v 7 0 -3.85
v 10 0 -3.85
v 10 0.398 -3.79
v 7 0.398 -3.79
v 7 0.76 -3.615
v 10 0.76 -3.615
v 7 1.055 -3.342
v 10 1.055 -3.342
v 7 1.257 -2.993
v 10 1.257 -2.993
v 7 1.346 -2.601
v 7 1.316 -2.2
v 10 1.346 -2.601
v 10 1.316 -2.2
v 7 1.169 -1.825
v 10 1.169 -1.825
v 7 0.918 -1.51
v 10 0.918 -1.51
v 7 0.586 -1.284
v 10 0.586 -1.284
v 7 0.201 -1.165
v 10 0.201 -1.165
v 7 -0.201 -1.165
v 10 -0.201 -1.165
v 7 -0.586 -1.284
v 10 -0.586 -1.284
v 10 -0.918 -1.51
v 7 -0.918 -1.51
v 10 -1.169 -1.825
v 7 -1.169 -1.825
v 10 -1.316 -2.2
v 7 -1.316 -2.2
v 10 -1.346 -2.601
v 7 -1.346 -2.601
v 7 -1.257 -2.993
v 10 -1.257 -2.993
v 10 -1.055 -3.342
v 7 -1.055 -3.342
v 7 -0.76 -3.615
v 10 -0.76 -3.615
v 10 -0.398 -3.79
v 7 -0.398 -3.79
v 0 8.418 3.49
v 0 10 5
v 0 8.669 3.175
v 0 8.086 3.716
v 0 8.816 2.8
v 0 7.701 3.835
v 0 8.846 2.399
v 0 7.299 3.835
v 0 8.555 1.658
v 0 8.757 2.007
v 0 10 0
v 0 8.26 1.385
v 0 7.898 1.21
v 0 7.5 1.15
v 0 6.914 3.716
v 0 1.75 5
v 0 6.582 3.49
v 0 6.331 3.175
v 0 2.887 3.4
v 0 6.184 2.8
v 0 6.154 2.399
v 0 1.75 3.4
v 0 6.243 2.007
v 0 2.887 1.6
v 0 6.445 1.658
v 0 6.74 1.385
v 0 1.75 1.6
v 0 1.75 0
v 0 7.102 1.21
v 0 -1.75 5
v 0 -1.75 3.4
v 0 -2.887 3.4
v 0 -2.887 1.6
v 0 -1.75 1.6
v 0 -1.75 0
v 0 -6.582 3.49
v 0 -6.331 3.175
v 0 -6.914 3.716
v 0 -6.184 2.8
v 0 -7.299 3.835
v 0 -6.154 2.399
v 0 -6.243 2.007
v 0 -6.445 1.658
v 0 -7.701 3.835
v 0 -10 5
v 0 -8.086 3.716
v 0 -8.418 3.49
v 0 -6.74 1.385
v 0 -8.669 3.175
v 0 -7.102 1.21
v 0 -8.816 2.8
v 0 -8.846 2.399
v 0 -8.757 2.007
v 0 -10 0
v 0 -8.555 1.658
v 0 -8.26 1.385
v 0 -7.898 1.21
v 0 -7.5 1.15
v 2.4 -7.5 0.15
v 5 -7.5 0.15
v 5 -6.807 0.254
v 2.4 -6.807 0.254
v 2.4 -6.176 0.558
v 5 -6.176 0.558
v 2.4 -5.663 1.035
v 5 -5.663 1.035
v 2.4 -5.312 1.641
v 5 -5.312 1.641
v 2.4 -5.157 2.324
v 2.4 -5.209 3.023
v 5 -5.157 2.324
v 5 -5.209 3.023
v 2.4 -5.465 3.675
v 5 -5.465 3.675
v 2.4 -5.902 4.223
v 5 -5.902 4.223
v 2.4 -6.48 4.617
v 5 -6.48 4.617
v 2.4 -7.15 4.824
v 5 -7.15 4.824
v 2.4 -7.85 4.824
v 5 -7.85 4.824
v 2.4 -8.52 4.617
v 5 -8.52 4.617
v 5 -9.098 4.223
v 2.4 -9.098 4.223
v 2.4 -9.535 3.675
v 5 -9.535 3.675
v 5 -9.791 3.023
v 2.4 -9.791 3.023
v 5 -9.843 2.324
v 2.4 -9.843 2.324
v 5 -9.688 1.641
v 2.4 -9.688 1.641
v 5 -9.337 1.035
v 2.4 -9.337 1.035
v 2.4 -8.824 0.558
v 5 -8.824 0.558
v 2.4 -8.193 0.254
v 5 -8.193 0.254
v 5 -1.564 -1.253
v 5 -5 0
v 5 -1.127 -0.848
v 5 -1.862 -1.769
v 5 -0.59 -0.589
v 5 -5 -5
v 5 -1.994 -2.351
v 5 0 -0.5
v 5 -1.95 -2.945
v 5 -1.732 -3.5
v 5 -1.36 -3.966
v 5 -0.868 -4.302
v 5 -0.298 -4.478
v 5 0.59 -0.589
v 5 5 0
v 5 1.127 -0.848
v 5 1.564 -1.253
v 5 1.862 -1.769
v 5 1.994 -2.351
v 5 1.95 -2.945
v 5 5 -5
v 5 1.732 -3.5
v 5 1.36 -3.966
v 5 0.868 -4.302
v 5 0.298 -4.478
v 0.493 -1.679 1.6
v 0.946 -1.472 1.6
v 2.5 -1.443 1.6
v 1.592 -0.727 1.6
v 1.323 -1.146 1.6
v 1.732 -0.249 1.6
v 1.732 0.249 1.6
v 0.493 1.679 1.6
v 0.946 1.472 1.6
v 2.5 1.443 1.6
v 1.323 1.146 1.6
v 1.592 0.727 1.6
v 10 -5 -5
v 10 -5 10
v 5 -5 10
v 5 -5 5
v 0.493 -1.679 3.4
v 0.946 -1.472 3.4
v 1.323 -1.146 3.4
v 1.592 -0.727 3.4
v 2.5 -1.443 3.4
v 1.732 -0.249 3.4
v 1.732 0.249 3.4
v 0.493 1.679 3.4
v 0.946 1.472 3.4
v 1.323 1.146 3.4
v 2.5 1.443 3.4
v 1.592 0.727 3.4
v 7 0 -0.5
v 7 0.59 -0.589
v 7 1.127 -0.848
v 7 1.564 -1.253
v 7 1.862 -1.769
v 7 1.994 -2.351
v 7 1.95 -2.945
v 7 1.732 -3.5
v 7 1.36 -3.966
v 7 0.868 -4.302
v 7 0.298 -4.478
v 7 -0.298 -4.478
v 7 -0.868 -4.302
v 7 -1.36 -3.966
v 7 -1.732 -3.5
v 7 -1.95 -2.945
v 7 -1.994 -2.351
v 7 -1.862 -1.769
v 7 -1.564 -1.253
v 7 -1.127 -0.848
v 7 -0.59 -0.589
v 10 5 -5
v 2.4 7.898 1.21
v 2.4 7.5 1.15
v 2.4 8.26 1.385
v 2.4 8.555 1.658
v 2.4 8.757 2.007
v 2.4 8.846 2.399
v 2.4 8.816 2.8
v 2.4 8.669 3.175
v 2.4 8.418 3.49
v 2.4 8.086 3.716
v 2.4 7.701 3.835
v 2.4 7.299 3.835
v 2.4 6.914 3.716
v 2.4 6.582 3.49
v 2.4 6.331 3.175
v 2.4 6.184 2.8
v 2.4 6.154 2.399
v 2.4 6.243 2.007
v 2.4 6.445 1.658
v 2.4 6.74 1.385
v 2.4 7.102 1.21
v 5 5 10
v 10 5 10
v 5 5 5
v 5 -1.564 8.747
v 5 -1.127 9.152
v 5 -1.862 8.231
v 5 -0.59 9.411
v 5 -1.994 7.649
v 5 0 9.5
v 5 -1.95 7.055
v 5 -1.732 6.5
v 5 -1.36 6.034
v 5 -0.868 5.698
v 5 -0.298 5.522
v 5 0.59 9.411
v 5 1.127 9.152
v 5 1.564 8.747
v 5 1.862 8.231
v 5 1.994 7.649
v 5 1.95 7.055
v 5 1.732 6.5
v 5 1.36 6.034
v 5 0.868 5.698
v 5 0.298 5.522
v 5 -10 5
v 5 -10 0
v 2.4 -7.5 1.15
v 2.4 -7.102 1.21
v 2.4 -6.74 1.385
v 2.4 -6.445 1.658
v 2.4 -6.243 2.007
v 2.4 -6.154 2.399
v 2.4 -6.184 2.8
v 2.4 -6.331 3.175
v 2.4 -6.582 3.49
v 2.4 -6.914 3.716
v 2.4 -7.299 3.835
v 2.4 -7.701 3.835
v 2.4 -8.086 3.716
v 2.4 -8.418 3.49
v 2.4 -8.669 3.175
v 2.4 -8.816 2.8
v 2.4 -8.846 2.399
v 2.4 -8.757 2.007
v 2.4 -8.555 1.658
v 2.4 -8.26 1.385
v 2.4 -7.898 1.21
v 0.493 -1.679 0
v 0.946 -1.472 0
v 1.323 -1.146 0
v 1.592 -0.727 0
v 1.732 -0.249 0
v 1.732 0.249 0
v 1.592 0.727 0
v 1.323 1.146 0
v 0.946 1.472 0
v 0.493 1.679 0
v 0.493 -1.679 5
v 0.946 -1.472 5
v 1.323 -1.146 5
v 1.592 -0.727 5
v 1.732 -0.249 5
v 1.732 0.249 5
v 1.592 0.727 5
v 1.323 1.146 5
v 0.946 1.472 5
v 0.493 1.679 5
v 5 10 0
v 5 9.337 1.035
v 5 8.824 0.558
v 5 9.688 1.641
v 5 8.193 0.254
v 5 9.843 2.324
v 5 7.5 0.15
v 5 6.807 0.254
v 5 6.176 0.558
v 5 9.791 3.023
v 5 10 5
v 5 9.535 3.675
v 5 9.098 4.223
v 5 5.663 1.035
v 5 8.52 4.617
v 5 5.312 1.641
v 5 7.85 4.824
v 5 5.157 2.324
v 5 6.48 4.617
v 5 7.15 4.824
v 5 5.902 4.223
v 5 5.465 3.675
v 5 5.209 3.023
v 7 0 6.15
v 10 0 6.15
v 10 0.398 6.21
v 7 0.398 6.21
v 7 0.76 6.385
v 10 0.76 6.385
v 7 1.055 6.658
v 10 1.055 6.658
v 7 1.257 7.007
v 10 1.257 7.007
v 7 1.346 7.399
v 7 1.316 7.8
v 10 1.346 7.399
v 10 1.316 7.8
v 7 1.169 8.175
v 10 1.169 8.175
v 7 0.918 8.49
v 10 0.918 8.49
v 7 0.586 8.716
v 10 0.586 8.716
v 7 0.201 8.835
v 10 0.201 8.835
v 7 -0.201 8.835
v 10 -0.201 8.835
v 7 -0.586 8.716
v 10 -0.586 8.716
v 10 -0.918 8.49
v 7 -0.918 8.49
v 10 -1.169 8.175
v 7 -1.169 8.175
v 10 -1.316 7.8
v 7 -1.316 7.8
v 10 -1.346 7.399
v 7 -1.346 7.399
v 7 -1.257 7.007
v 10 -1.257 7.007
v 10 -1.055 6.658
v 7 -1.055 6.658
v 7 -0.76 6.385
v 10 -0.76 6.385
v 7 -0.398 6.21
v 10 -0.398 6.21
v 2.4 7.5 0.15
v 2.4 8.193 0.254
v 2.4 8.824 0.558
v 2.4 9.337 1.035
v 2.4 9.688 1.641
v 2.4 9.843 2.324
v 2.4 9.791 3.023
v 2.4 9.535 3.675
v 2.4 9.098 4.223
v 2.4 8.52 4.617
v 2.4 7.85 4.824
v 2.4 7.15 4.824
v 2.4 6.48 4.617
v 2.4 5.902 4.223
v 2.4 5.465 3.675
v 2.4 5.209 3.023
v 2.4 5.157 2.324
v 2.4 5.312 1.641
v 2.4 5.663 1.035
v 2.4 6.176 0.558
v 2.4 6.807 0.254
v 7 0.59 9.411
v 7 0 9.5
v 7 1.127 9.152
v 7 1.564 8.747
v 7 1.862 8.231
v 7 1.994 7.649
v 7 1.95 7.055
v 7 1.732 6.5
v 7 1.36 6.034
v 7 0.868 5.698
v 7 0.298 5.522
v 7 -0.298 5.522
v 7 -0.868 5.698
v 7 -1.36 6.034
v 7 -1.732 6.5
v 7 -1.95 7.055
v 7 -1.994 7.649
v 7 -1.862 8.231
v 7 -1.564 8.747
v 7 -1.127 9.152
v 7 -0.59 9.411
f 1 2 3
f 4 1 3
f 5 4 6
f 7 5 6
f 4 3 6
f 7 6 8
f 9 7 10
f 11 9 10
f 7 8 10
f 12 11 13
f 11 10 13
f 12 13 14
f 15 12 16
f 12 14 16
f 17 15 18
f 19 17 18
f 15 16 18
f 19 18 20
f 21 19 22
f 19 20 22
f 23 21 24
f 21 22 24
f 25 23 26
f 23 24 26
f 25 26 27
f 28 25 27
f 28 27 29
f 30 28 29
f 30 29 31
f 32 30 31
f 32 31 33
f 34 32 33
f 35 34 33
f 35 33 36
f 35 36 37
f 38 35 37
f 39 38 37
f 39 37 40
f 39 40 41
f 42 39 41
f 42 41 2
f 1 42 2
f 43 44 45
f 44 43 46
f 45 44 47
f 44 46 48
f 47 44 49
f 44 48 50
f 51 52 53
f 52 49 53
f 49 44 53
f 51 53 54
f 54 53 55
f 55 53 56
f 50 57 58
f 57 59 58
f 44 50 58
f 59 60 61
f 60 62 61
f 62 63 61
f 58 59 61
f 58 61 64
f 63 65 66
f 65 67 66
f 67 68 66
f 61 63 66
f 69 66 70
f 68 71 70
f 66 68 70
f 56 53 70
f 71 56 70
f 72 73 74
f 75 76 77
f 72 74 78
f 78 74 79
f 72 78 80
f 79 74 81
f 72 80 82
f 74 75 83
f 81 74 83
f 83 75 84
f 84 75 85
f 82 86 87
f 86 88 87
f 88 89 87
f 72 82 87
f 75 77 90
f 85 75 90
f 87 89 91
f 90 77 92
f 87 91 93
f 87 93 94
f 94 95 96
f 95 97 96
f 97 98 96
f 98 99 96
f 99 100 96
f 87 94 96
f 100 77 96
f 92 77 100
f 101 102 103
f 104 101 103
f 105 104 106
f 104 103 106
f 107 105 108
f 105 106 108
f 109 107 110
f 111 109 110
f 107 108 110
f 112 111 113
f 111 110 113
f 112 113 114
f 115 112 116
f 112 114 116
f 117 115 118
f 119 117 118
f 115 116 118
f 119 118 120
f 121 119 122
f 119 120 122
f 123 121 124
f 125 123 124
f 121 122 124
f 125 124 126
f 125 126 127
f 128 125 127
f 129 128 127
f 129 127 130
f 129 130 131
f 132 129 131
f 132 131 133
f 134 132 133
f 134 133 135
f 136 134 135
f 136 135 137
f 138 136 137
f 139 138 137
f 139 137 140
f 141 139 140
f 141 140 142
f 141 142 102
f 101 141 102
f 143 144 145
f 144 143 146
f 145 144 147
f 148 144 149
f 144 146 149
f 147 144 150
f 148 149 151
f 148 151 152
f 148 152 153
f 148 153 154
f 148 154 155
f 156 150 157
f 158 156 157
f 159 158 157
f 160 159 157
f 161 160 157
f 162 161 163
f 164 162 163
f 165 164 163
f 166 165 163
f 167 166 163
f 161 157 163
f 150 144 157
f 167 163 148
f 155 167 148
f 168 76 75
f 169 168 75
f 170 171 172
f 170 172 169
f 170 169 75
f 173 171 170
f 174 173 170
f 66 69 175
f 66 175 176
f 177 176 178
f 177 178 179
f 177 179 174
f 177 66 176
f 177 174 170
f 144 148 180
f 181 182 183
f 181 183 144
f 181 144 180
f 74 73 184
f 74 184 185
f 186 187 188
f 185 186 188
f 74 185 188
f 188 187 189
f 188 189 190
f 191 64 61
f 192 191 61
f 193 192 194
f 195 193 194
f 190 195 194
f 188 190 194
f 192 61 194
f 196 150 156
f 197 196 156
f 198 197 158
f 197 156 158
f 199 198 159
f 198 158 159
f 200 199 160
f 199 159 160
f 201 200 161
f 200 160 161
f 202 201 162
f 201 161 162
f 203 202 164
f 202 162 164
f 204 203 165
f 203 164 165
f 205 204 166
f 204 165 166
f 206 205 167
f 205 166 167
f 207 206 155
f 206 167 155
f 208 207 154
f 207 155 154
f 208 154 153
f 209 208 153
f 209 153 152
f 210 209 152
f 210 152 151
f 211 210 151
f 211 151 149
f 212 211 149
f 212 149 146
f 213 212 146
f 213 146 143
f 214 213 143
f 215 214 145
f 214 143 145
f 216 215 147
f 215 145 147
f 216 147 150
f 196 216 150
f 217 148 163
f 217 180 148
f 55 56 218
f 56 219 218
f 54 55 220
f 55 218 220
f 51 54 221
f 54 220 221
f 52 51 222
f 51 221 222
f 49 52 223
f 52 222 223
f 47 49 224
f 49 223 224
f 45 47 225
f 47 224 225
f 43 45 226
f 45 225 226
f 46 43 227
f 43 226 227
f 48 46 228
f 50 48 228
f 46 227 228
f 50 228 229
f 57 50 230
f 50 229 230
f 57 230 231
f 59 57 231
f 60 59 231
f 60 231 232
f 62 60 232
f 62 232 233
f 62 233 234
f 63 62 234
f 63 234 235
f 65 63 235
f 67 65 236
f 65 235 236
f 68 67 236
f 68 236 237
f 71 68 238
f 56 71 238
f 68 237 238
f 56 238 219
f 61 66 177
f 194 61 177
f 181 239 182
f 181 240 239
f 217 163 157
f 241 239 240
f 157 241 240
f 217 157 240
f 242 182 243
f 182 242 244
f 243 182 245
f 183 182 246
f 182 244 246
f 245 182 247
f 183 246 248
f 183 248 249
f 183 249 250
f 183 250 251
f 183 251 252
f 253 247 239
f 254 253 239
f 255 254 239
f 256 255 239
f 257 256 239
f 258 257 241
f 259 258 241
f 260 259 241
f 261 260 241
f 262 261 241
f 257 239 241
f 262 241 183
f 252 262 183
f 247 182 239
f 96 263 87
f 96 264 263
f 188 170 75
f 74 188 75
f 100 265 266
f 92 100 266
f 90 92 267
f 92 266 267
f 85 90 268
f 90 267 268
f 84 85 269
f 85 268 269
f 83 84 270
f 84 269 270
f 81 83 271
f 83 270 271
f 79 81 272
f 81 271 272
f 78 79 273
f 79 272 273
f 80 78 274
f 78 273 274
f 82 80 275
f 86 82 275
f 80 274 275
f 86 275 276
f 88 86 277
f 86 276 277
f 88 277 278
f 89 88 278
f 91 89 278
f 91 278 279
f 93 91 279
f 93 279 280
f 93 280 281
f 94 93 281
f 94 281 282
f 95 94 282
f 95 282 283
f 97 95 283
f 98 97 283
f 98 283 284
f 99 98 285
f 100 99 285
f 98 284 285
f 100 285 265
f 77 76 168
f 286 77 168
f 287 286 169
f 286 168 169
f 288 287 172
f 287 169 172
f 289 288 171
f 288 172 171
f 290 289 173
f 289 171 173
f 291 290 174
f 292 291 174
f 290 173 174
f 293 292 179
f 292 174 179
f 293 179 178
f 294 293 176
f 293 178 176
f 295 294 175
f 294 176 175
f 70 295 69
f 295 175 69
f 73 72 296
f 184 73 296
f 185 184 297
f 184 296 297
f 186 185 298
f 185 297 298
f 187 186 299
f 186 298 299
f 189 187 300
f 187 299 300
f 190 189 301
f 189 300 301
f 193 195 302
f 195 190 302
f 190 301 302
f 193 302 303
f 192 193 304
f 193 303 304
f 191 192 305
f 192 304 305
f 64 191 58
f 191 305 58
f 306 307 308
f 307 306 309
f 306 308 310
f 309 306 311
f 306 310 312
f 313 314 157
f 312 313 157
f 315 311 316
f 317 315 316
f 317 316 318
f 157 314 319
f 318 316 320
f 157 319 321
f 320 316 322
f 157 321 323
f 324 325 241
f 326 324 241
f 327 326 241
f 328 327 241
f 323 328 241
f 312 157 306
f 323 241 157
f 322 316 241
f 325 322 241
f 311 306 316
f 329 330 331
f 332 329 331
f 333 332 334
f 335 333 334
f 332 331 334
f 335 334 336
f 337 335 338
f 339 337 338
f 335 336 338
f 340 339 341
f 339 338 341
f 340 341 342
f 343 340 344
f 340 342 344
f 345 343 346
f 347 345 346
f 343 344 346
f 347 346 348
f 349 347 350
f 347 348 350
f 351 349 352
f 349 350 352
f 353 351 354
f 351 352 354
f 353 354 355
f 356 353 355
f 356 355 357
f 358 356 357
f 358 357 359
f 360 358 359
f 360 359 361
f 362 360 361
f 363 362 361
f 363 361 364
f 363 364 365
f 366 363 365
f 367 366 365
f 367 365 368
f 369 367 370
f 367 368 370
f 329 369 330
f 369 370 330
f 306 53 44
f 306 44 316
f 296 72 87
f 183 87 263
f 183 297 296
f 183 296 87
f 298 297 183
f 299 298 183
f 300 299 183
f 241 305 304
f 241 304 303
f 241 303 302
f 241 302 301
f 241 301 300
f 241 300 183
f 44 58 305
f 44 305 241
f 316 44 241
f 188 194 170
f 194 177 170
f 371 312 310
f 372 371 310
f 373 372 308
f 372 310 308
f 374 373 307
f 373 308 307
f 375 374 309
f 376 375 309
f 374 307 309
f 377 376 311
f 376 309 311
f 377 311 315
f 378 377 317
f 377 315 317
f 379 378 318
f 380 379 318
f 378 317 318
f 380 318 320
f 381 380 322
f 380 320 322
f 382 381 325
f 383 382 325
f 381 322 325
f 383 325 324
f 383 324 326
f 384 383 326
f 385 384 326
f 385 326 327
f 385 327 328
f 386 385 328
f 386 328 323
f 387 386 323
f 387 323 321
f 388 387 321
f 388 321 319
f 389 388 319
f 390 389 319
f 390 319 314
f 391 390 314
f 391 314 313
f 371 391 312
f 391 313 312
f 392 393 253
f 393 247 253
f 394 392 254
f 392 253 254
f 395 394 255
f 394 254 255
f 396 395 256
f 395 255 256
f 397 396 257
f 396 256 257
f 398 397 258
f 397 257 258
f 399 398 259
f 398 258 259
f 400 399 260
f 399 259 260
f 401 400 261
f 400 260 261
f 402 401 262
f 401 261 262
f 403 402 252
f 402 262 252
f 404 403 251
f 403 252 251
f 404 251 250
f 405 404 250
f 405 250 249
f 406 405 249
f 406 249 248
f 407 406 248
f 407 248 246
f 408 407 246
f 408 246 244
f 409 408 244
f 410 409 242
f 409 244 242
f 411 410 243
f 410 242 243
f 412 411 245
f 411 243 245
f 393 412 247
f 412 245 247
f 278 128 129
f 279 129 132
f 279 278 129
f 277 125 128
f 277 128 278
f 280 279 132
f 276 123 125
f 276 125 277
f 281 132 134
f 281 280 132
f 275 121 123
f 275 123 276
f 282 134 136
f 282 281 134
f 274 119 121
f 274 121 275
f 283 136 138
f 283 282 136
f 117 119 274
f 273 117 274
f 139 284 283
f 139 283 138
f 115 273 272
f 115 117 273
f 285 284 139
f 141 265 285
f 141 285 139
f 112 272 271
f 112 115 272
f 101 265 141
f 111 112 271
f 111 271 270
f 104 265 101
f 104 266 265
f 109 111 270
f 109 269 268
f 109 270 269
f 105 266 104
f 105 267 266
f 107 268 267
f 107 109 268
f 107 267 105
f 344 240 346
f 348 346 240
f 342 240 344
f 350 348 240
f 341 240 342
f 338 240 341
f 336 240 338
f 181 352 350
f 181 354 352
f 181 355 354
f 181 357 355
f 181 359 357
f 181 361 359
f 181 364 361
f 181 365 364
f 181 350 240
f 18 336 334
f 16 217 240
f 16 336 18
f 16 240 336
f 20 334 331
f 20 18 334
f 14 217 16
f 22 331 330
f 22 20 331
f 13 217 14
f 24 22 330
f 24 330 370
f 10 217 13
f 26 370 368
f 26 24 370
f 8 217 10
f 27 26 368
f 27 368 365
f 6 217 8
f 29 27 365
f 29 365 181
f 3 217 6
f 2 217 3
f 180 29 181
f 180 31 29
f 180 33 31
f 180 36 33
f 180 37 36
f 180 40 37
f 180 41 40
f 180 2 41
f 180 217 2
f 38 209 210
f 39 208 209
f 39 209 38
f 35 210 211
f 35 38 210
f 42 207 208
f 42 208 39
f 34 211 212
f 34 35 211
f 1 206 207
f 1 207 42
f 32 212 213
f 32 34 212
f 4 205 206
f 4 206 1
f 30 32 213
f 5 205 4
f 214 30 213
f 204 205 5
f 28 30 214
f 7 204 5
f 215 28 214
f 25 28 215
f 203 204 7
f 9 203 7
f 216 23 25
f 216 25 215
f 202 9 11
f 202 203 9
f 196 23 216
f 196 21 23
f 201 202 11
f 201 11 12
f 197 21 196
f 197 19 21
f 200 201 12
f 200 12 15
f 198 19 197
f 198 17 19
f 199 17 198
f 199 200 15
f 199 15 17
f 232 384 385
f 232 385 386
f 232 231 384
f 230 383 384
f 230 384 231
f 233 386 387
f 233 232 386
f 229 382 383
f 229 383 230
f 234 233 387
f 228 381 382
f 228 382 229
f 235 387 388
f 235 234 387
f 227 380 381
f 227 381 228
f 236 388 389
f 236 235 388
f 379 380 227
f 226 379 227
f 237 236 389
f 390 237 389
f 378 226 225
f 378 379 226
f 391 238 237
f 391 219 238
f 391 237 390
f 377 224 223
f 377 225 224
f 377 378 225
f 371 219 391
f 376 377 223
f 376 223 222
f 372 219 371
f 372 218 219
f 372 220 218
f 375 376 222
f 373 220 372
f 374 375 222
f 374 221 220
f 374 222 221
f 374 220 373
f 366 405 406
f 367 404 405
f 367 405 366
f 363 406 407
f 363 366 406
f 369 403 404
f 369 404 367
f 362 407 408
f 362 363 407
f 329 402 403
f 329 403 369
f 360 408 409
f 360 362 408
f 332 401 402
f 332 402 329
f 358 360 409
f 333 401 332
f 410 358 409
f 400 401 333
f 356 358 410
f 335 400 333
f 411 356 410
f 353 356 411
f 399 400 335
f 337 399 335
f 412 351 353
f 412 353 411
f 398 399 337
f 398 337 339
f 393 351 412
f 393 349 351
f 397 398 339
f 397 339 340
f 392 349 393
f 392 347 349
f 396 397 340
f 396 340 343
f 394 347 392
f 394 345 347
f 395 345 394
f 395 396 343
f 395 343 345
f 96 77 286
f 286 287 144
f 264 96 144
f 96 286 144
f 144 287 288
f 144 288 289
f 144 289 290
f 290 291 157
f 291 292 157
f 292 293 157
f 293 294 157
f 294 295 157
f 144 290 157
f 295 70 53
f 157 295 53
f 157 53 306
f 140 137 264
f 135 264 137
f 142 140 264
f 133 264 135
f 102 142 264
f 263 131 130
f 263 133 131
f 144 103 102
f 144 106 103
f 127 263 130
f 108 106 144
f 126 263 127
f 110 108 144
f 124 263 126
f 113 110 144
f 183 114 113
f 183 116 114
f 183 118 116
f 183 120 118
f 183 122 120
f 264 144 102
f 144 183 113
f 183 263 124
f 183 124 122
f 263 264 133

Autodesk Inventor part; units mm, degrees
ref_plane "YZ Plane" through (0, 0, 0) normal (1, 0, 0) x (0, 1, 0)
ref_plane "XZ Plane" through (0, 0, 0) normal (0, 1, 0) x (-1, 0, 0)
ref_plane "XY Plane" through (0, 0, 0) normal (0, 0, 1) x (1, 0, 0)
sketch "Sketch1" plane through (0, 0, 0) normal (0, 0, 1) x (1, 0, 0)
  line L0 (10, -10) -> (-10, -10)
  line L1 (-10, -10) -> (-10, 10)
  line L2 (-10, 10) -> (10, 10)
  line L3 (10, 10) -> (10, -10)
  line L4 (10, -10) -> (-10, 10) construction
  line L5 (-10, -10) -> (10, 10) construction
  line L6 (10, -10) -> (6, -10)
  line L7 (6, 10) -> (10, 10)
  line L8 (10, 10) -> (10, -10)
  line L9 (0, 10) -> (0, -10)
  line L10 (0, -10) -> (0, 10)
  point P0 (0, 0)
  dimension "d0" = 20
  dimension "d1" = 20
extrude "Extrusion1" add sketch "Sketch1" along normal blind 5 contours L0 L9 L2 L3
ref_plane "Work Plane1" through (0, 0, 2.5) normal (0, 0, 1) x (1, 0, 0)
sketch "Sketch2" plane through (0, 0, 2.5) normal (0, 0, 1) x (1, 0, 0)
  line L0 (0, 10) -> (0, -10) projected
  line L1 (0, 2.8868) -> (2.5, 1.4434)
  line L2 (2.5, 1.4434) -> (2.5, -1.4434)
  line L3 (2.5, -1.4434) -> (0, -2.8868)
  line L4 (0, -2.8868) -> (-2.5, -1.4434)
  line L5 (-2.5, -1.4434) -> (-2.5, 1.4434)
  line L6 (-2.5, 1.4434) -> (0, 2.8868)
  point P0 (0, 0)
  point P1 (0, 0)
  dimension "d12" = 5
extrude "Extrusion2" cut sketch "Sketch2" along normal mid plane 1.8
sketch "Sketch3" plane through (0, 0, 5) normal (0, 0, 1) x (1, 0, 0)
  circle A0 centre (0, 0) radius 1.75
  dimension "d15" = 3.5
extrude "Extrusion3" cut sketch "Sketch3" against normal blind 8
sketch "Sketch4" plane through (10, -10, 0) normal (1, 0, 0) x (0, 0, -1)
  circle A0 centre (-2.5, 17.5) radius 1.35
  circle A1 centre (-2.5, 2.5) radius 1.35
  line L0 (0, 20) -> (-5, 20) projected
  line L1 (0, 0) -> (-5, 0) projected
  line L2 (0, 0) -> (0, 20) projected
  point P0 (0, 10)
  dimension "d18" = 2.5
  dimension "d19" = 2.5
  dimension "d20" = 2.5
  dimension "d21" = 2.5
  dimension "d22" = 2.7
  dimension "d23" = 2.7
extrude "Extrusion4" cut sketch "Sketch4" against normal blind 25
sketch "Sketch5" plane through (10, -10, 0) normal (1, 0, 0) x (0, 0, -1)
  circle A0 centre (-2.5, 17.5) radius 1.35 projected
  circle A1 centre (-2.5, 17.5) radius 2
  circle A2 centre (-2.5, 2.5) radius 1.35 projected
  circle A3 centre (-2.5, 2.5) radius 2
  point P0 (0, 10)
  dimension "d26" = 4
  dimension "d27" = 4
extrude "Extrusion5" cut sketch "Sketch5" against normal blind 4 contours A0 | A1 | A2 | A3
sketch "Sketch6" plane through (0, 0, 5) normal (0, 0, 1) x (1, 0, 0)
  point P0 (0, 0)
sketch "Sketch7" plane through (0, 0, 5) normal (0, 0, 1) x (1, 0, 0)
  line L0 (10, -10) -> (10, 10) projected
  line L1 (10, 10) -> (5, 10)
  line L2 (5, 10) -> (5, 5)
  line L3 (5, 5) -> (10, 5)
  line L4 (10, 5) -> (10, 10)
  line L5 (0, -10) -> (10, -10) projected
  line L6 (10, -10) -> (5, -10)
  line L7 (5, -10) -> (5, -5)
  line L8 (5, -5) -> (10, -5)
  line L9 (10, -5) -> (10, -10)
  point P0 (0, 0)
  dimension "d30" = 5
  dimension "d31" = 5
  dimension "d32" = 5
  dimension "d33" = 5
extrude "Extrusion6" cut sketch "Sketch7" against normal blind 10
sketch "Sketch8" plane through (10, -5, 0) normal (1, 0, 0) x (0, 0, -1)
  line L0 (0, 0) -> (5, 0)
  line L1 (5, 0) -> (5, 10)
  line L2 (5, 10) -> (0, 10)
  line L3 (0, 10) -> (0, 0)
  line L4 (-5, 0) -> (-5, 10) projected
  line L5 (-5, 10) -> (-10, 10)
  line L6 (-10, 10) -> (-10, 0)
  line L7 (-10, 0) -> (-5, 0)
  line L8 (-5, 0) -> (-5, 10)
  circle A0 centre (-7.5, 5) radius 1.35
  circle A1 centre (2.5, 5) radius 1.35
  point P0 (0, 5)
  point P1 (-7.5, 0)
  dimension "d36" = 5
  dimension "d37" = 5
  dimension "d38" = 5
  dimension "d39" = 2.7
  dimension "d40" = 2.7
  dimension "d41" = 5
  dimension "d42" = 5
  dimension "d43" = 5
  dimension "d44" = 5
  dimension "d45" = 2.5
  dimension "d46" = 2.5
extrude "Extrusion7" add sketch "Sketch8" against normal blind 5
sketch "Sketch9" plane through (5, -5, 0) normal (-1, 0, 0) x (0, 0, 1)
  circle A0 centre (7.5, 5) radius 1.35 projected
  circle A1 centre (7.5, 5) radius 2
  circle A2 centre (-2.5, 5) radius 1.35 projected
  circle A3 centre (-2.5, 5) radius 2
  point P0 (0, 5)
  dimension "d49" = 4
  dimension "d50" = 4
extrude "Extrusion8" cut sketch "Sketch9" against normal blind 2 contours A0 | A1 | A2 | A3
sketch "Sketch10" plane through (5, 10, 5) normal (1, 0, 0) x (0, 0, -1)
  circle A0 centre (2.5, -2.5) radius 1.35 projected
  circle A1 centre (2.5, -2.5) radius 2.35
  circle A2 centre (2.5, -17.5) radius 1.35 projected
  circle A3 centre (2.5, -17.5) radius 2.35
  point P0 (5, -10)
  dimension "d53" = 4.7
  dimension "d54" = 4.7
extrude "Extrusion9" cut sketch "Sketch10" against normal blind 2.6
equation "\"d18\" = d19"
equation "\"d20\" = d19"
equation "\"d21\" = d19"
equation "\"d23\" = d22"
equation "\"d27\" = d26"
equation "\"d39\" = d40"
equation "\"d42\" = d41"
equation "\"d50\" = d49"
properties part number "POMSliderMotor"
